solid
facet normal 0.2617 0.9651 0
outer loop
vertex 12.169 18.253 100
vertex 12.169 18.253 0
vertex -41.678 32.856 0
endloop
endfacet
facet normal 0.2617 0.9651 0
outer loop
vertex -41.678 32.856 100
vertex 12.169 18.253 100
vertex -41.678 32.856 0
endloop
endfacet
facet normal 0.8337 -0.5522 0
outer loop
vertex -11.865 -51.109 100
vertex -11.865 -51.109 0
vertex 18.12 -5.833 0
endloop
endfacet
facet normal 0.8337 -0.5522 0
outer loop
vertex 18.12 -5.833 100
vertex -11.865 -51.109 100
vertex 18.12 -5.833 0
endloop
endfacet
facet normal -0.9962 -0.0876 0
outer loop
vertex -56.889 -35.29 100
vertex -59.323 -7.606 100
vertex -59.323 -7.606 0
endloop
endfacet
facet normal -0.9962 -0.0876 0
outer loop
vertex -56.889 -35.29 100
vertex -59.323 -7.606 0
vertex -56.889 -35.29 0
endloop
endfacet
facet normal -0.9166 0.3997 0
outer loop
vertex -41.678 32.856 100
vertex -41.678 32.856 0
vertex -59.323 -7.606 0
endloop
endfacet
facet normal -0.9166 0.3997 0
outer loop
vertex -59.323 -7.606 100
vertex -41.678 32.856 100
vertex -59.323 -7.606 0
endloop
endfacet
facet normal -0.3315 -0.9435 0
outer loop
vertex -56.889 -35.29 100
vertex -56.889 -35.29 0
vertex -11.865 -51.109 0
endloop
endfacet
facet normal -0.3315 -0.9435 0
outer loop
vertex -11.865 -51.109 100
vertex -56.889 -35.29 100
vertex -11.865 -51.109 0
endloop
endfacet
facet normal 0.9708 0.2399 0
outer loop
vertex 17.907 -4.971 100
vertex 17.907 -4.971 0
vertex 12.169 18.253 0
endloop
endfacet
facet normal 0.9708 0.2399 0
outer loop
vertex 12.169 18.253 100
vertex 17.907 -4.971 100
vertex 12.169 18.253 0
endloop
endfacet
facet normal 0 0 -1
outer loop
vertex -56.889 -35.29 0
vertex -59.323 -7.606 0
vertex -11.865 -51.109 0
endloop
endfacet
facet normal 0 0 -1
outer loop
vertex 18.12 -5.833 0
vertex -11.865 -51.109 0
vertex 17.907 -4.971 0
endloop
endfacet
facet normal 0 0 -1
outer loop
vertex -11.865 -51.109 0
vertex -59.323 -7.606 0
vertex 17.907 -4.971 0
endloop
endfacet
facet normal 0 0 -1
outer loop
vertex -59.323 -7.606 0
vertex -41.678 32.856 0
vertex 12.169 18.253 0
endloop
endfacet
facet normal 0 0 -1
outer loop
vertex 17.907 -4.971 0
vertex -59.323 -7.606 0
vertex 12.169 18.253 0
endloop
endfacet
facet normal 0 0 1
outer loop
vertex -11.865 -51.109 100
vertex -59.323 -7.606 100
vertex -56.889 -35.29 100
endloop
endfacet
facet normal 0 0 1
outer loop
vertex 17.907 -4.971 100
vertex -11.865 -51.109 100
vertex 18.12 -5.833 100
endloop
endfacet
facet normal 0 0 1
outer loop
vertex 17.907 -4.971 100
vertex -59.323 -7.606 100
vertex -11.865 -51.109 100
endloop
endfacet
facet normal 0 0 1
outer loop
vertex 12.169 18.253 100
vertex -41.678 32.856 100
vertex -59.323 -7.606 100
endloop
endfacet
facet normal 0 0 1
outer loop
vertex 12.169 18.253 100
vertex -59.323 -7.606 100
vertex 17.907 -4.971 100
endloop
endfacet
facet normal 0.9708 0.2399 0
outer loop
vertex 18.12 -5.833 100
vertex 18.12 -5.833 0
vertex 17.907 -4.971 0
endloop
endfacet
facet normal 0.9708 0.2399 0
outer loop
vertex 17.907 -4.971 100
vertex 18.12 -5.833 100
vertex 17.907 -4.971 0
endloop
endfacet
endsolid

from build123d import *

# Parameters (mm, degrees)
F1_DEPTH = 100


with BuildPart() as f1:
    # F0 (on Top) → F1 (new body)
    with BuildSketch(Plane.XY):
        Polygon((-11.8646007031, -21.5996578336), (-33.768478781, 10.9519390389), (-45.1385089955, -11.7881209321), align=None)
        Polygon((12.1688209474, 18.2532314211), (-41.6782125831, 32.8558161855), (-33.768478781, 10.9519390389), (1.2571312237, 0.1591635659), align=None)
        Polygon((17.9066221318, -4.9712029599), (12.1688209474, 18.2532314211), (1.2571312237, 0.1591635659), align=None)
        Polygon((-45.1385089955, -11.7881209321), (-59.3230053782, -7.6055130921), (-56.8892396986, -35.2895818651), align=None)
        Polygon((-33.768478781, 10.9519390389), (-41.6782125831, 32.8558161855), (-59.3230053782, -7.6055130921), (-45.1385089955, -11.7881209321), align=None)
        Polygon((1.2571312237, 0.1591635659), (-33.768478781, 10.9519390389), (-11.8646007031, -21.5996578336), align=None)
        Polygon((17.9066221318, -4.9712029599), (1.2571312237, 0.1591635659), (-11.8646007031, -21.5996578336), (-45.1385089955, -11.7881209321), (-56.8892396986, -35.2895818651), (-11.8646007031, -51.1090494692), (18.1195368493, -5.8330006636), align=None)
    extrude(amount=F1_DEPTH)


solid = f1.part
